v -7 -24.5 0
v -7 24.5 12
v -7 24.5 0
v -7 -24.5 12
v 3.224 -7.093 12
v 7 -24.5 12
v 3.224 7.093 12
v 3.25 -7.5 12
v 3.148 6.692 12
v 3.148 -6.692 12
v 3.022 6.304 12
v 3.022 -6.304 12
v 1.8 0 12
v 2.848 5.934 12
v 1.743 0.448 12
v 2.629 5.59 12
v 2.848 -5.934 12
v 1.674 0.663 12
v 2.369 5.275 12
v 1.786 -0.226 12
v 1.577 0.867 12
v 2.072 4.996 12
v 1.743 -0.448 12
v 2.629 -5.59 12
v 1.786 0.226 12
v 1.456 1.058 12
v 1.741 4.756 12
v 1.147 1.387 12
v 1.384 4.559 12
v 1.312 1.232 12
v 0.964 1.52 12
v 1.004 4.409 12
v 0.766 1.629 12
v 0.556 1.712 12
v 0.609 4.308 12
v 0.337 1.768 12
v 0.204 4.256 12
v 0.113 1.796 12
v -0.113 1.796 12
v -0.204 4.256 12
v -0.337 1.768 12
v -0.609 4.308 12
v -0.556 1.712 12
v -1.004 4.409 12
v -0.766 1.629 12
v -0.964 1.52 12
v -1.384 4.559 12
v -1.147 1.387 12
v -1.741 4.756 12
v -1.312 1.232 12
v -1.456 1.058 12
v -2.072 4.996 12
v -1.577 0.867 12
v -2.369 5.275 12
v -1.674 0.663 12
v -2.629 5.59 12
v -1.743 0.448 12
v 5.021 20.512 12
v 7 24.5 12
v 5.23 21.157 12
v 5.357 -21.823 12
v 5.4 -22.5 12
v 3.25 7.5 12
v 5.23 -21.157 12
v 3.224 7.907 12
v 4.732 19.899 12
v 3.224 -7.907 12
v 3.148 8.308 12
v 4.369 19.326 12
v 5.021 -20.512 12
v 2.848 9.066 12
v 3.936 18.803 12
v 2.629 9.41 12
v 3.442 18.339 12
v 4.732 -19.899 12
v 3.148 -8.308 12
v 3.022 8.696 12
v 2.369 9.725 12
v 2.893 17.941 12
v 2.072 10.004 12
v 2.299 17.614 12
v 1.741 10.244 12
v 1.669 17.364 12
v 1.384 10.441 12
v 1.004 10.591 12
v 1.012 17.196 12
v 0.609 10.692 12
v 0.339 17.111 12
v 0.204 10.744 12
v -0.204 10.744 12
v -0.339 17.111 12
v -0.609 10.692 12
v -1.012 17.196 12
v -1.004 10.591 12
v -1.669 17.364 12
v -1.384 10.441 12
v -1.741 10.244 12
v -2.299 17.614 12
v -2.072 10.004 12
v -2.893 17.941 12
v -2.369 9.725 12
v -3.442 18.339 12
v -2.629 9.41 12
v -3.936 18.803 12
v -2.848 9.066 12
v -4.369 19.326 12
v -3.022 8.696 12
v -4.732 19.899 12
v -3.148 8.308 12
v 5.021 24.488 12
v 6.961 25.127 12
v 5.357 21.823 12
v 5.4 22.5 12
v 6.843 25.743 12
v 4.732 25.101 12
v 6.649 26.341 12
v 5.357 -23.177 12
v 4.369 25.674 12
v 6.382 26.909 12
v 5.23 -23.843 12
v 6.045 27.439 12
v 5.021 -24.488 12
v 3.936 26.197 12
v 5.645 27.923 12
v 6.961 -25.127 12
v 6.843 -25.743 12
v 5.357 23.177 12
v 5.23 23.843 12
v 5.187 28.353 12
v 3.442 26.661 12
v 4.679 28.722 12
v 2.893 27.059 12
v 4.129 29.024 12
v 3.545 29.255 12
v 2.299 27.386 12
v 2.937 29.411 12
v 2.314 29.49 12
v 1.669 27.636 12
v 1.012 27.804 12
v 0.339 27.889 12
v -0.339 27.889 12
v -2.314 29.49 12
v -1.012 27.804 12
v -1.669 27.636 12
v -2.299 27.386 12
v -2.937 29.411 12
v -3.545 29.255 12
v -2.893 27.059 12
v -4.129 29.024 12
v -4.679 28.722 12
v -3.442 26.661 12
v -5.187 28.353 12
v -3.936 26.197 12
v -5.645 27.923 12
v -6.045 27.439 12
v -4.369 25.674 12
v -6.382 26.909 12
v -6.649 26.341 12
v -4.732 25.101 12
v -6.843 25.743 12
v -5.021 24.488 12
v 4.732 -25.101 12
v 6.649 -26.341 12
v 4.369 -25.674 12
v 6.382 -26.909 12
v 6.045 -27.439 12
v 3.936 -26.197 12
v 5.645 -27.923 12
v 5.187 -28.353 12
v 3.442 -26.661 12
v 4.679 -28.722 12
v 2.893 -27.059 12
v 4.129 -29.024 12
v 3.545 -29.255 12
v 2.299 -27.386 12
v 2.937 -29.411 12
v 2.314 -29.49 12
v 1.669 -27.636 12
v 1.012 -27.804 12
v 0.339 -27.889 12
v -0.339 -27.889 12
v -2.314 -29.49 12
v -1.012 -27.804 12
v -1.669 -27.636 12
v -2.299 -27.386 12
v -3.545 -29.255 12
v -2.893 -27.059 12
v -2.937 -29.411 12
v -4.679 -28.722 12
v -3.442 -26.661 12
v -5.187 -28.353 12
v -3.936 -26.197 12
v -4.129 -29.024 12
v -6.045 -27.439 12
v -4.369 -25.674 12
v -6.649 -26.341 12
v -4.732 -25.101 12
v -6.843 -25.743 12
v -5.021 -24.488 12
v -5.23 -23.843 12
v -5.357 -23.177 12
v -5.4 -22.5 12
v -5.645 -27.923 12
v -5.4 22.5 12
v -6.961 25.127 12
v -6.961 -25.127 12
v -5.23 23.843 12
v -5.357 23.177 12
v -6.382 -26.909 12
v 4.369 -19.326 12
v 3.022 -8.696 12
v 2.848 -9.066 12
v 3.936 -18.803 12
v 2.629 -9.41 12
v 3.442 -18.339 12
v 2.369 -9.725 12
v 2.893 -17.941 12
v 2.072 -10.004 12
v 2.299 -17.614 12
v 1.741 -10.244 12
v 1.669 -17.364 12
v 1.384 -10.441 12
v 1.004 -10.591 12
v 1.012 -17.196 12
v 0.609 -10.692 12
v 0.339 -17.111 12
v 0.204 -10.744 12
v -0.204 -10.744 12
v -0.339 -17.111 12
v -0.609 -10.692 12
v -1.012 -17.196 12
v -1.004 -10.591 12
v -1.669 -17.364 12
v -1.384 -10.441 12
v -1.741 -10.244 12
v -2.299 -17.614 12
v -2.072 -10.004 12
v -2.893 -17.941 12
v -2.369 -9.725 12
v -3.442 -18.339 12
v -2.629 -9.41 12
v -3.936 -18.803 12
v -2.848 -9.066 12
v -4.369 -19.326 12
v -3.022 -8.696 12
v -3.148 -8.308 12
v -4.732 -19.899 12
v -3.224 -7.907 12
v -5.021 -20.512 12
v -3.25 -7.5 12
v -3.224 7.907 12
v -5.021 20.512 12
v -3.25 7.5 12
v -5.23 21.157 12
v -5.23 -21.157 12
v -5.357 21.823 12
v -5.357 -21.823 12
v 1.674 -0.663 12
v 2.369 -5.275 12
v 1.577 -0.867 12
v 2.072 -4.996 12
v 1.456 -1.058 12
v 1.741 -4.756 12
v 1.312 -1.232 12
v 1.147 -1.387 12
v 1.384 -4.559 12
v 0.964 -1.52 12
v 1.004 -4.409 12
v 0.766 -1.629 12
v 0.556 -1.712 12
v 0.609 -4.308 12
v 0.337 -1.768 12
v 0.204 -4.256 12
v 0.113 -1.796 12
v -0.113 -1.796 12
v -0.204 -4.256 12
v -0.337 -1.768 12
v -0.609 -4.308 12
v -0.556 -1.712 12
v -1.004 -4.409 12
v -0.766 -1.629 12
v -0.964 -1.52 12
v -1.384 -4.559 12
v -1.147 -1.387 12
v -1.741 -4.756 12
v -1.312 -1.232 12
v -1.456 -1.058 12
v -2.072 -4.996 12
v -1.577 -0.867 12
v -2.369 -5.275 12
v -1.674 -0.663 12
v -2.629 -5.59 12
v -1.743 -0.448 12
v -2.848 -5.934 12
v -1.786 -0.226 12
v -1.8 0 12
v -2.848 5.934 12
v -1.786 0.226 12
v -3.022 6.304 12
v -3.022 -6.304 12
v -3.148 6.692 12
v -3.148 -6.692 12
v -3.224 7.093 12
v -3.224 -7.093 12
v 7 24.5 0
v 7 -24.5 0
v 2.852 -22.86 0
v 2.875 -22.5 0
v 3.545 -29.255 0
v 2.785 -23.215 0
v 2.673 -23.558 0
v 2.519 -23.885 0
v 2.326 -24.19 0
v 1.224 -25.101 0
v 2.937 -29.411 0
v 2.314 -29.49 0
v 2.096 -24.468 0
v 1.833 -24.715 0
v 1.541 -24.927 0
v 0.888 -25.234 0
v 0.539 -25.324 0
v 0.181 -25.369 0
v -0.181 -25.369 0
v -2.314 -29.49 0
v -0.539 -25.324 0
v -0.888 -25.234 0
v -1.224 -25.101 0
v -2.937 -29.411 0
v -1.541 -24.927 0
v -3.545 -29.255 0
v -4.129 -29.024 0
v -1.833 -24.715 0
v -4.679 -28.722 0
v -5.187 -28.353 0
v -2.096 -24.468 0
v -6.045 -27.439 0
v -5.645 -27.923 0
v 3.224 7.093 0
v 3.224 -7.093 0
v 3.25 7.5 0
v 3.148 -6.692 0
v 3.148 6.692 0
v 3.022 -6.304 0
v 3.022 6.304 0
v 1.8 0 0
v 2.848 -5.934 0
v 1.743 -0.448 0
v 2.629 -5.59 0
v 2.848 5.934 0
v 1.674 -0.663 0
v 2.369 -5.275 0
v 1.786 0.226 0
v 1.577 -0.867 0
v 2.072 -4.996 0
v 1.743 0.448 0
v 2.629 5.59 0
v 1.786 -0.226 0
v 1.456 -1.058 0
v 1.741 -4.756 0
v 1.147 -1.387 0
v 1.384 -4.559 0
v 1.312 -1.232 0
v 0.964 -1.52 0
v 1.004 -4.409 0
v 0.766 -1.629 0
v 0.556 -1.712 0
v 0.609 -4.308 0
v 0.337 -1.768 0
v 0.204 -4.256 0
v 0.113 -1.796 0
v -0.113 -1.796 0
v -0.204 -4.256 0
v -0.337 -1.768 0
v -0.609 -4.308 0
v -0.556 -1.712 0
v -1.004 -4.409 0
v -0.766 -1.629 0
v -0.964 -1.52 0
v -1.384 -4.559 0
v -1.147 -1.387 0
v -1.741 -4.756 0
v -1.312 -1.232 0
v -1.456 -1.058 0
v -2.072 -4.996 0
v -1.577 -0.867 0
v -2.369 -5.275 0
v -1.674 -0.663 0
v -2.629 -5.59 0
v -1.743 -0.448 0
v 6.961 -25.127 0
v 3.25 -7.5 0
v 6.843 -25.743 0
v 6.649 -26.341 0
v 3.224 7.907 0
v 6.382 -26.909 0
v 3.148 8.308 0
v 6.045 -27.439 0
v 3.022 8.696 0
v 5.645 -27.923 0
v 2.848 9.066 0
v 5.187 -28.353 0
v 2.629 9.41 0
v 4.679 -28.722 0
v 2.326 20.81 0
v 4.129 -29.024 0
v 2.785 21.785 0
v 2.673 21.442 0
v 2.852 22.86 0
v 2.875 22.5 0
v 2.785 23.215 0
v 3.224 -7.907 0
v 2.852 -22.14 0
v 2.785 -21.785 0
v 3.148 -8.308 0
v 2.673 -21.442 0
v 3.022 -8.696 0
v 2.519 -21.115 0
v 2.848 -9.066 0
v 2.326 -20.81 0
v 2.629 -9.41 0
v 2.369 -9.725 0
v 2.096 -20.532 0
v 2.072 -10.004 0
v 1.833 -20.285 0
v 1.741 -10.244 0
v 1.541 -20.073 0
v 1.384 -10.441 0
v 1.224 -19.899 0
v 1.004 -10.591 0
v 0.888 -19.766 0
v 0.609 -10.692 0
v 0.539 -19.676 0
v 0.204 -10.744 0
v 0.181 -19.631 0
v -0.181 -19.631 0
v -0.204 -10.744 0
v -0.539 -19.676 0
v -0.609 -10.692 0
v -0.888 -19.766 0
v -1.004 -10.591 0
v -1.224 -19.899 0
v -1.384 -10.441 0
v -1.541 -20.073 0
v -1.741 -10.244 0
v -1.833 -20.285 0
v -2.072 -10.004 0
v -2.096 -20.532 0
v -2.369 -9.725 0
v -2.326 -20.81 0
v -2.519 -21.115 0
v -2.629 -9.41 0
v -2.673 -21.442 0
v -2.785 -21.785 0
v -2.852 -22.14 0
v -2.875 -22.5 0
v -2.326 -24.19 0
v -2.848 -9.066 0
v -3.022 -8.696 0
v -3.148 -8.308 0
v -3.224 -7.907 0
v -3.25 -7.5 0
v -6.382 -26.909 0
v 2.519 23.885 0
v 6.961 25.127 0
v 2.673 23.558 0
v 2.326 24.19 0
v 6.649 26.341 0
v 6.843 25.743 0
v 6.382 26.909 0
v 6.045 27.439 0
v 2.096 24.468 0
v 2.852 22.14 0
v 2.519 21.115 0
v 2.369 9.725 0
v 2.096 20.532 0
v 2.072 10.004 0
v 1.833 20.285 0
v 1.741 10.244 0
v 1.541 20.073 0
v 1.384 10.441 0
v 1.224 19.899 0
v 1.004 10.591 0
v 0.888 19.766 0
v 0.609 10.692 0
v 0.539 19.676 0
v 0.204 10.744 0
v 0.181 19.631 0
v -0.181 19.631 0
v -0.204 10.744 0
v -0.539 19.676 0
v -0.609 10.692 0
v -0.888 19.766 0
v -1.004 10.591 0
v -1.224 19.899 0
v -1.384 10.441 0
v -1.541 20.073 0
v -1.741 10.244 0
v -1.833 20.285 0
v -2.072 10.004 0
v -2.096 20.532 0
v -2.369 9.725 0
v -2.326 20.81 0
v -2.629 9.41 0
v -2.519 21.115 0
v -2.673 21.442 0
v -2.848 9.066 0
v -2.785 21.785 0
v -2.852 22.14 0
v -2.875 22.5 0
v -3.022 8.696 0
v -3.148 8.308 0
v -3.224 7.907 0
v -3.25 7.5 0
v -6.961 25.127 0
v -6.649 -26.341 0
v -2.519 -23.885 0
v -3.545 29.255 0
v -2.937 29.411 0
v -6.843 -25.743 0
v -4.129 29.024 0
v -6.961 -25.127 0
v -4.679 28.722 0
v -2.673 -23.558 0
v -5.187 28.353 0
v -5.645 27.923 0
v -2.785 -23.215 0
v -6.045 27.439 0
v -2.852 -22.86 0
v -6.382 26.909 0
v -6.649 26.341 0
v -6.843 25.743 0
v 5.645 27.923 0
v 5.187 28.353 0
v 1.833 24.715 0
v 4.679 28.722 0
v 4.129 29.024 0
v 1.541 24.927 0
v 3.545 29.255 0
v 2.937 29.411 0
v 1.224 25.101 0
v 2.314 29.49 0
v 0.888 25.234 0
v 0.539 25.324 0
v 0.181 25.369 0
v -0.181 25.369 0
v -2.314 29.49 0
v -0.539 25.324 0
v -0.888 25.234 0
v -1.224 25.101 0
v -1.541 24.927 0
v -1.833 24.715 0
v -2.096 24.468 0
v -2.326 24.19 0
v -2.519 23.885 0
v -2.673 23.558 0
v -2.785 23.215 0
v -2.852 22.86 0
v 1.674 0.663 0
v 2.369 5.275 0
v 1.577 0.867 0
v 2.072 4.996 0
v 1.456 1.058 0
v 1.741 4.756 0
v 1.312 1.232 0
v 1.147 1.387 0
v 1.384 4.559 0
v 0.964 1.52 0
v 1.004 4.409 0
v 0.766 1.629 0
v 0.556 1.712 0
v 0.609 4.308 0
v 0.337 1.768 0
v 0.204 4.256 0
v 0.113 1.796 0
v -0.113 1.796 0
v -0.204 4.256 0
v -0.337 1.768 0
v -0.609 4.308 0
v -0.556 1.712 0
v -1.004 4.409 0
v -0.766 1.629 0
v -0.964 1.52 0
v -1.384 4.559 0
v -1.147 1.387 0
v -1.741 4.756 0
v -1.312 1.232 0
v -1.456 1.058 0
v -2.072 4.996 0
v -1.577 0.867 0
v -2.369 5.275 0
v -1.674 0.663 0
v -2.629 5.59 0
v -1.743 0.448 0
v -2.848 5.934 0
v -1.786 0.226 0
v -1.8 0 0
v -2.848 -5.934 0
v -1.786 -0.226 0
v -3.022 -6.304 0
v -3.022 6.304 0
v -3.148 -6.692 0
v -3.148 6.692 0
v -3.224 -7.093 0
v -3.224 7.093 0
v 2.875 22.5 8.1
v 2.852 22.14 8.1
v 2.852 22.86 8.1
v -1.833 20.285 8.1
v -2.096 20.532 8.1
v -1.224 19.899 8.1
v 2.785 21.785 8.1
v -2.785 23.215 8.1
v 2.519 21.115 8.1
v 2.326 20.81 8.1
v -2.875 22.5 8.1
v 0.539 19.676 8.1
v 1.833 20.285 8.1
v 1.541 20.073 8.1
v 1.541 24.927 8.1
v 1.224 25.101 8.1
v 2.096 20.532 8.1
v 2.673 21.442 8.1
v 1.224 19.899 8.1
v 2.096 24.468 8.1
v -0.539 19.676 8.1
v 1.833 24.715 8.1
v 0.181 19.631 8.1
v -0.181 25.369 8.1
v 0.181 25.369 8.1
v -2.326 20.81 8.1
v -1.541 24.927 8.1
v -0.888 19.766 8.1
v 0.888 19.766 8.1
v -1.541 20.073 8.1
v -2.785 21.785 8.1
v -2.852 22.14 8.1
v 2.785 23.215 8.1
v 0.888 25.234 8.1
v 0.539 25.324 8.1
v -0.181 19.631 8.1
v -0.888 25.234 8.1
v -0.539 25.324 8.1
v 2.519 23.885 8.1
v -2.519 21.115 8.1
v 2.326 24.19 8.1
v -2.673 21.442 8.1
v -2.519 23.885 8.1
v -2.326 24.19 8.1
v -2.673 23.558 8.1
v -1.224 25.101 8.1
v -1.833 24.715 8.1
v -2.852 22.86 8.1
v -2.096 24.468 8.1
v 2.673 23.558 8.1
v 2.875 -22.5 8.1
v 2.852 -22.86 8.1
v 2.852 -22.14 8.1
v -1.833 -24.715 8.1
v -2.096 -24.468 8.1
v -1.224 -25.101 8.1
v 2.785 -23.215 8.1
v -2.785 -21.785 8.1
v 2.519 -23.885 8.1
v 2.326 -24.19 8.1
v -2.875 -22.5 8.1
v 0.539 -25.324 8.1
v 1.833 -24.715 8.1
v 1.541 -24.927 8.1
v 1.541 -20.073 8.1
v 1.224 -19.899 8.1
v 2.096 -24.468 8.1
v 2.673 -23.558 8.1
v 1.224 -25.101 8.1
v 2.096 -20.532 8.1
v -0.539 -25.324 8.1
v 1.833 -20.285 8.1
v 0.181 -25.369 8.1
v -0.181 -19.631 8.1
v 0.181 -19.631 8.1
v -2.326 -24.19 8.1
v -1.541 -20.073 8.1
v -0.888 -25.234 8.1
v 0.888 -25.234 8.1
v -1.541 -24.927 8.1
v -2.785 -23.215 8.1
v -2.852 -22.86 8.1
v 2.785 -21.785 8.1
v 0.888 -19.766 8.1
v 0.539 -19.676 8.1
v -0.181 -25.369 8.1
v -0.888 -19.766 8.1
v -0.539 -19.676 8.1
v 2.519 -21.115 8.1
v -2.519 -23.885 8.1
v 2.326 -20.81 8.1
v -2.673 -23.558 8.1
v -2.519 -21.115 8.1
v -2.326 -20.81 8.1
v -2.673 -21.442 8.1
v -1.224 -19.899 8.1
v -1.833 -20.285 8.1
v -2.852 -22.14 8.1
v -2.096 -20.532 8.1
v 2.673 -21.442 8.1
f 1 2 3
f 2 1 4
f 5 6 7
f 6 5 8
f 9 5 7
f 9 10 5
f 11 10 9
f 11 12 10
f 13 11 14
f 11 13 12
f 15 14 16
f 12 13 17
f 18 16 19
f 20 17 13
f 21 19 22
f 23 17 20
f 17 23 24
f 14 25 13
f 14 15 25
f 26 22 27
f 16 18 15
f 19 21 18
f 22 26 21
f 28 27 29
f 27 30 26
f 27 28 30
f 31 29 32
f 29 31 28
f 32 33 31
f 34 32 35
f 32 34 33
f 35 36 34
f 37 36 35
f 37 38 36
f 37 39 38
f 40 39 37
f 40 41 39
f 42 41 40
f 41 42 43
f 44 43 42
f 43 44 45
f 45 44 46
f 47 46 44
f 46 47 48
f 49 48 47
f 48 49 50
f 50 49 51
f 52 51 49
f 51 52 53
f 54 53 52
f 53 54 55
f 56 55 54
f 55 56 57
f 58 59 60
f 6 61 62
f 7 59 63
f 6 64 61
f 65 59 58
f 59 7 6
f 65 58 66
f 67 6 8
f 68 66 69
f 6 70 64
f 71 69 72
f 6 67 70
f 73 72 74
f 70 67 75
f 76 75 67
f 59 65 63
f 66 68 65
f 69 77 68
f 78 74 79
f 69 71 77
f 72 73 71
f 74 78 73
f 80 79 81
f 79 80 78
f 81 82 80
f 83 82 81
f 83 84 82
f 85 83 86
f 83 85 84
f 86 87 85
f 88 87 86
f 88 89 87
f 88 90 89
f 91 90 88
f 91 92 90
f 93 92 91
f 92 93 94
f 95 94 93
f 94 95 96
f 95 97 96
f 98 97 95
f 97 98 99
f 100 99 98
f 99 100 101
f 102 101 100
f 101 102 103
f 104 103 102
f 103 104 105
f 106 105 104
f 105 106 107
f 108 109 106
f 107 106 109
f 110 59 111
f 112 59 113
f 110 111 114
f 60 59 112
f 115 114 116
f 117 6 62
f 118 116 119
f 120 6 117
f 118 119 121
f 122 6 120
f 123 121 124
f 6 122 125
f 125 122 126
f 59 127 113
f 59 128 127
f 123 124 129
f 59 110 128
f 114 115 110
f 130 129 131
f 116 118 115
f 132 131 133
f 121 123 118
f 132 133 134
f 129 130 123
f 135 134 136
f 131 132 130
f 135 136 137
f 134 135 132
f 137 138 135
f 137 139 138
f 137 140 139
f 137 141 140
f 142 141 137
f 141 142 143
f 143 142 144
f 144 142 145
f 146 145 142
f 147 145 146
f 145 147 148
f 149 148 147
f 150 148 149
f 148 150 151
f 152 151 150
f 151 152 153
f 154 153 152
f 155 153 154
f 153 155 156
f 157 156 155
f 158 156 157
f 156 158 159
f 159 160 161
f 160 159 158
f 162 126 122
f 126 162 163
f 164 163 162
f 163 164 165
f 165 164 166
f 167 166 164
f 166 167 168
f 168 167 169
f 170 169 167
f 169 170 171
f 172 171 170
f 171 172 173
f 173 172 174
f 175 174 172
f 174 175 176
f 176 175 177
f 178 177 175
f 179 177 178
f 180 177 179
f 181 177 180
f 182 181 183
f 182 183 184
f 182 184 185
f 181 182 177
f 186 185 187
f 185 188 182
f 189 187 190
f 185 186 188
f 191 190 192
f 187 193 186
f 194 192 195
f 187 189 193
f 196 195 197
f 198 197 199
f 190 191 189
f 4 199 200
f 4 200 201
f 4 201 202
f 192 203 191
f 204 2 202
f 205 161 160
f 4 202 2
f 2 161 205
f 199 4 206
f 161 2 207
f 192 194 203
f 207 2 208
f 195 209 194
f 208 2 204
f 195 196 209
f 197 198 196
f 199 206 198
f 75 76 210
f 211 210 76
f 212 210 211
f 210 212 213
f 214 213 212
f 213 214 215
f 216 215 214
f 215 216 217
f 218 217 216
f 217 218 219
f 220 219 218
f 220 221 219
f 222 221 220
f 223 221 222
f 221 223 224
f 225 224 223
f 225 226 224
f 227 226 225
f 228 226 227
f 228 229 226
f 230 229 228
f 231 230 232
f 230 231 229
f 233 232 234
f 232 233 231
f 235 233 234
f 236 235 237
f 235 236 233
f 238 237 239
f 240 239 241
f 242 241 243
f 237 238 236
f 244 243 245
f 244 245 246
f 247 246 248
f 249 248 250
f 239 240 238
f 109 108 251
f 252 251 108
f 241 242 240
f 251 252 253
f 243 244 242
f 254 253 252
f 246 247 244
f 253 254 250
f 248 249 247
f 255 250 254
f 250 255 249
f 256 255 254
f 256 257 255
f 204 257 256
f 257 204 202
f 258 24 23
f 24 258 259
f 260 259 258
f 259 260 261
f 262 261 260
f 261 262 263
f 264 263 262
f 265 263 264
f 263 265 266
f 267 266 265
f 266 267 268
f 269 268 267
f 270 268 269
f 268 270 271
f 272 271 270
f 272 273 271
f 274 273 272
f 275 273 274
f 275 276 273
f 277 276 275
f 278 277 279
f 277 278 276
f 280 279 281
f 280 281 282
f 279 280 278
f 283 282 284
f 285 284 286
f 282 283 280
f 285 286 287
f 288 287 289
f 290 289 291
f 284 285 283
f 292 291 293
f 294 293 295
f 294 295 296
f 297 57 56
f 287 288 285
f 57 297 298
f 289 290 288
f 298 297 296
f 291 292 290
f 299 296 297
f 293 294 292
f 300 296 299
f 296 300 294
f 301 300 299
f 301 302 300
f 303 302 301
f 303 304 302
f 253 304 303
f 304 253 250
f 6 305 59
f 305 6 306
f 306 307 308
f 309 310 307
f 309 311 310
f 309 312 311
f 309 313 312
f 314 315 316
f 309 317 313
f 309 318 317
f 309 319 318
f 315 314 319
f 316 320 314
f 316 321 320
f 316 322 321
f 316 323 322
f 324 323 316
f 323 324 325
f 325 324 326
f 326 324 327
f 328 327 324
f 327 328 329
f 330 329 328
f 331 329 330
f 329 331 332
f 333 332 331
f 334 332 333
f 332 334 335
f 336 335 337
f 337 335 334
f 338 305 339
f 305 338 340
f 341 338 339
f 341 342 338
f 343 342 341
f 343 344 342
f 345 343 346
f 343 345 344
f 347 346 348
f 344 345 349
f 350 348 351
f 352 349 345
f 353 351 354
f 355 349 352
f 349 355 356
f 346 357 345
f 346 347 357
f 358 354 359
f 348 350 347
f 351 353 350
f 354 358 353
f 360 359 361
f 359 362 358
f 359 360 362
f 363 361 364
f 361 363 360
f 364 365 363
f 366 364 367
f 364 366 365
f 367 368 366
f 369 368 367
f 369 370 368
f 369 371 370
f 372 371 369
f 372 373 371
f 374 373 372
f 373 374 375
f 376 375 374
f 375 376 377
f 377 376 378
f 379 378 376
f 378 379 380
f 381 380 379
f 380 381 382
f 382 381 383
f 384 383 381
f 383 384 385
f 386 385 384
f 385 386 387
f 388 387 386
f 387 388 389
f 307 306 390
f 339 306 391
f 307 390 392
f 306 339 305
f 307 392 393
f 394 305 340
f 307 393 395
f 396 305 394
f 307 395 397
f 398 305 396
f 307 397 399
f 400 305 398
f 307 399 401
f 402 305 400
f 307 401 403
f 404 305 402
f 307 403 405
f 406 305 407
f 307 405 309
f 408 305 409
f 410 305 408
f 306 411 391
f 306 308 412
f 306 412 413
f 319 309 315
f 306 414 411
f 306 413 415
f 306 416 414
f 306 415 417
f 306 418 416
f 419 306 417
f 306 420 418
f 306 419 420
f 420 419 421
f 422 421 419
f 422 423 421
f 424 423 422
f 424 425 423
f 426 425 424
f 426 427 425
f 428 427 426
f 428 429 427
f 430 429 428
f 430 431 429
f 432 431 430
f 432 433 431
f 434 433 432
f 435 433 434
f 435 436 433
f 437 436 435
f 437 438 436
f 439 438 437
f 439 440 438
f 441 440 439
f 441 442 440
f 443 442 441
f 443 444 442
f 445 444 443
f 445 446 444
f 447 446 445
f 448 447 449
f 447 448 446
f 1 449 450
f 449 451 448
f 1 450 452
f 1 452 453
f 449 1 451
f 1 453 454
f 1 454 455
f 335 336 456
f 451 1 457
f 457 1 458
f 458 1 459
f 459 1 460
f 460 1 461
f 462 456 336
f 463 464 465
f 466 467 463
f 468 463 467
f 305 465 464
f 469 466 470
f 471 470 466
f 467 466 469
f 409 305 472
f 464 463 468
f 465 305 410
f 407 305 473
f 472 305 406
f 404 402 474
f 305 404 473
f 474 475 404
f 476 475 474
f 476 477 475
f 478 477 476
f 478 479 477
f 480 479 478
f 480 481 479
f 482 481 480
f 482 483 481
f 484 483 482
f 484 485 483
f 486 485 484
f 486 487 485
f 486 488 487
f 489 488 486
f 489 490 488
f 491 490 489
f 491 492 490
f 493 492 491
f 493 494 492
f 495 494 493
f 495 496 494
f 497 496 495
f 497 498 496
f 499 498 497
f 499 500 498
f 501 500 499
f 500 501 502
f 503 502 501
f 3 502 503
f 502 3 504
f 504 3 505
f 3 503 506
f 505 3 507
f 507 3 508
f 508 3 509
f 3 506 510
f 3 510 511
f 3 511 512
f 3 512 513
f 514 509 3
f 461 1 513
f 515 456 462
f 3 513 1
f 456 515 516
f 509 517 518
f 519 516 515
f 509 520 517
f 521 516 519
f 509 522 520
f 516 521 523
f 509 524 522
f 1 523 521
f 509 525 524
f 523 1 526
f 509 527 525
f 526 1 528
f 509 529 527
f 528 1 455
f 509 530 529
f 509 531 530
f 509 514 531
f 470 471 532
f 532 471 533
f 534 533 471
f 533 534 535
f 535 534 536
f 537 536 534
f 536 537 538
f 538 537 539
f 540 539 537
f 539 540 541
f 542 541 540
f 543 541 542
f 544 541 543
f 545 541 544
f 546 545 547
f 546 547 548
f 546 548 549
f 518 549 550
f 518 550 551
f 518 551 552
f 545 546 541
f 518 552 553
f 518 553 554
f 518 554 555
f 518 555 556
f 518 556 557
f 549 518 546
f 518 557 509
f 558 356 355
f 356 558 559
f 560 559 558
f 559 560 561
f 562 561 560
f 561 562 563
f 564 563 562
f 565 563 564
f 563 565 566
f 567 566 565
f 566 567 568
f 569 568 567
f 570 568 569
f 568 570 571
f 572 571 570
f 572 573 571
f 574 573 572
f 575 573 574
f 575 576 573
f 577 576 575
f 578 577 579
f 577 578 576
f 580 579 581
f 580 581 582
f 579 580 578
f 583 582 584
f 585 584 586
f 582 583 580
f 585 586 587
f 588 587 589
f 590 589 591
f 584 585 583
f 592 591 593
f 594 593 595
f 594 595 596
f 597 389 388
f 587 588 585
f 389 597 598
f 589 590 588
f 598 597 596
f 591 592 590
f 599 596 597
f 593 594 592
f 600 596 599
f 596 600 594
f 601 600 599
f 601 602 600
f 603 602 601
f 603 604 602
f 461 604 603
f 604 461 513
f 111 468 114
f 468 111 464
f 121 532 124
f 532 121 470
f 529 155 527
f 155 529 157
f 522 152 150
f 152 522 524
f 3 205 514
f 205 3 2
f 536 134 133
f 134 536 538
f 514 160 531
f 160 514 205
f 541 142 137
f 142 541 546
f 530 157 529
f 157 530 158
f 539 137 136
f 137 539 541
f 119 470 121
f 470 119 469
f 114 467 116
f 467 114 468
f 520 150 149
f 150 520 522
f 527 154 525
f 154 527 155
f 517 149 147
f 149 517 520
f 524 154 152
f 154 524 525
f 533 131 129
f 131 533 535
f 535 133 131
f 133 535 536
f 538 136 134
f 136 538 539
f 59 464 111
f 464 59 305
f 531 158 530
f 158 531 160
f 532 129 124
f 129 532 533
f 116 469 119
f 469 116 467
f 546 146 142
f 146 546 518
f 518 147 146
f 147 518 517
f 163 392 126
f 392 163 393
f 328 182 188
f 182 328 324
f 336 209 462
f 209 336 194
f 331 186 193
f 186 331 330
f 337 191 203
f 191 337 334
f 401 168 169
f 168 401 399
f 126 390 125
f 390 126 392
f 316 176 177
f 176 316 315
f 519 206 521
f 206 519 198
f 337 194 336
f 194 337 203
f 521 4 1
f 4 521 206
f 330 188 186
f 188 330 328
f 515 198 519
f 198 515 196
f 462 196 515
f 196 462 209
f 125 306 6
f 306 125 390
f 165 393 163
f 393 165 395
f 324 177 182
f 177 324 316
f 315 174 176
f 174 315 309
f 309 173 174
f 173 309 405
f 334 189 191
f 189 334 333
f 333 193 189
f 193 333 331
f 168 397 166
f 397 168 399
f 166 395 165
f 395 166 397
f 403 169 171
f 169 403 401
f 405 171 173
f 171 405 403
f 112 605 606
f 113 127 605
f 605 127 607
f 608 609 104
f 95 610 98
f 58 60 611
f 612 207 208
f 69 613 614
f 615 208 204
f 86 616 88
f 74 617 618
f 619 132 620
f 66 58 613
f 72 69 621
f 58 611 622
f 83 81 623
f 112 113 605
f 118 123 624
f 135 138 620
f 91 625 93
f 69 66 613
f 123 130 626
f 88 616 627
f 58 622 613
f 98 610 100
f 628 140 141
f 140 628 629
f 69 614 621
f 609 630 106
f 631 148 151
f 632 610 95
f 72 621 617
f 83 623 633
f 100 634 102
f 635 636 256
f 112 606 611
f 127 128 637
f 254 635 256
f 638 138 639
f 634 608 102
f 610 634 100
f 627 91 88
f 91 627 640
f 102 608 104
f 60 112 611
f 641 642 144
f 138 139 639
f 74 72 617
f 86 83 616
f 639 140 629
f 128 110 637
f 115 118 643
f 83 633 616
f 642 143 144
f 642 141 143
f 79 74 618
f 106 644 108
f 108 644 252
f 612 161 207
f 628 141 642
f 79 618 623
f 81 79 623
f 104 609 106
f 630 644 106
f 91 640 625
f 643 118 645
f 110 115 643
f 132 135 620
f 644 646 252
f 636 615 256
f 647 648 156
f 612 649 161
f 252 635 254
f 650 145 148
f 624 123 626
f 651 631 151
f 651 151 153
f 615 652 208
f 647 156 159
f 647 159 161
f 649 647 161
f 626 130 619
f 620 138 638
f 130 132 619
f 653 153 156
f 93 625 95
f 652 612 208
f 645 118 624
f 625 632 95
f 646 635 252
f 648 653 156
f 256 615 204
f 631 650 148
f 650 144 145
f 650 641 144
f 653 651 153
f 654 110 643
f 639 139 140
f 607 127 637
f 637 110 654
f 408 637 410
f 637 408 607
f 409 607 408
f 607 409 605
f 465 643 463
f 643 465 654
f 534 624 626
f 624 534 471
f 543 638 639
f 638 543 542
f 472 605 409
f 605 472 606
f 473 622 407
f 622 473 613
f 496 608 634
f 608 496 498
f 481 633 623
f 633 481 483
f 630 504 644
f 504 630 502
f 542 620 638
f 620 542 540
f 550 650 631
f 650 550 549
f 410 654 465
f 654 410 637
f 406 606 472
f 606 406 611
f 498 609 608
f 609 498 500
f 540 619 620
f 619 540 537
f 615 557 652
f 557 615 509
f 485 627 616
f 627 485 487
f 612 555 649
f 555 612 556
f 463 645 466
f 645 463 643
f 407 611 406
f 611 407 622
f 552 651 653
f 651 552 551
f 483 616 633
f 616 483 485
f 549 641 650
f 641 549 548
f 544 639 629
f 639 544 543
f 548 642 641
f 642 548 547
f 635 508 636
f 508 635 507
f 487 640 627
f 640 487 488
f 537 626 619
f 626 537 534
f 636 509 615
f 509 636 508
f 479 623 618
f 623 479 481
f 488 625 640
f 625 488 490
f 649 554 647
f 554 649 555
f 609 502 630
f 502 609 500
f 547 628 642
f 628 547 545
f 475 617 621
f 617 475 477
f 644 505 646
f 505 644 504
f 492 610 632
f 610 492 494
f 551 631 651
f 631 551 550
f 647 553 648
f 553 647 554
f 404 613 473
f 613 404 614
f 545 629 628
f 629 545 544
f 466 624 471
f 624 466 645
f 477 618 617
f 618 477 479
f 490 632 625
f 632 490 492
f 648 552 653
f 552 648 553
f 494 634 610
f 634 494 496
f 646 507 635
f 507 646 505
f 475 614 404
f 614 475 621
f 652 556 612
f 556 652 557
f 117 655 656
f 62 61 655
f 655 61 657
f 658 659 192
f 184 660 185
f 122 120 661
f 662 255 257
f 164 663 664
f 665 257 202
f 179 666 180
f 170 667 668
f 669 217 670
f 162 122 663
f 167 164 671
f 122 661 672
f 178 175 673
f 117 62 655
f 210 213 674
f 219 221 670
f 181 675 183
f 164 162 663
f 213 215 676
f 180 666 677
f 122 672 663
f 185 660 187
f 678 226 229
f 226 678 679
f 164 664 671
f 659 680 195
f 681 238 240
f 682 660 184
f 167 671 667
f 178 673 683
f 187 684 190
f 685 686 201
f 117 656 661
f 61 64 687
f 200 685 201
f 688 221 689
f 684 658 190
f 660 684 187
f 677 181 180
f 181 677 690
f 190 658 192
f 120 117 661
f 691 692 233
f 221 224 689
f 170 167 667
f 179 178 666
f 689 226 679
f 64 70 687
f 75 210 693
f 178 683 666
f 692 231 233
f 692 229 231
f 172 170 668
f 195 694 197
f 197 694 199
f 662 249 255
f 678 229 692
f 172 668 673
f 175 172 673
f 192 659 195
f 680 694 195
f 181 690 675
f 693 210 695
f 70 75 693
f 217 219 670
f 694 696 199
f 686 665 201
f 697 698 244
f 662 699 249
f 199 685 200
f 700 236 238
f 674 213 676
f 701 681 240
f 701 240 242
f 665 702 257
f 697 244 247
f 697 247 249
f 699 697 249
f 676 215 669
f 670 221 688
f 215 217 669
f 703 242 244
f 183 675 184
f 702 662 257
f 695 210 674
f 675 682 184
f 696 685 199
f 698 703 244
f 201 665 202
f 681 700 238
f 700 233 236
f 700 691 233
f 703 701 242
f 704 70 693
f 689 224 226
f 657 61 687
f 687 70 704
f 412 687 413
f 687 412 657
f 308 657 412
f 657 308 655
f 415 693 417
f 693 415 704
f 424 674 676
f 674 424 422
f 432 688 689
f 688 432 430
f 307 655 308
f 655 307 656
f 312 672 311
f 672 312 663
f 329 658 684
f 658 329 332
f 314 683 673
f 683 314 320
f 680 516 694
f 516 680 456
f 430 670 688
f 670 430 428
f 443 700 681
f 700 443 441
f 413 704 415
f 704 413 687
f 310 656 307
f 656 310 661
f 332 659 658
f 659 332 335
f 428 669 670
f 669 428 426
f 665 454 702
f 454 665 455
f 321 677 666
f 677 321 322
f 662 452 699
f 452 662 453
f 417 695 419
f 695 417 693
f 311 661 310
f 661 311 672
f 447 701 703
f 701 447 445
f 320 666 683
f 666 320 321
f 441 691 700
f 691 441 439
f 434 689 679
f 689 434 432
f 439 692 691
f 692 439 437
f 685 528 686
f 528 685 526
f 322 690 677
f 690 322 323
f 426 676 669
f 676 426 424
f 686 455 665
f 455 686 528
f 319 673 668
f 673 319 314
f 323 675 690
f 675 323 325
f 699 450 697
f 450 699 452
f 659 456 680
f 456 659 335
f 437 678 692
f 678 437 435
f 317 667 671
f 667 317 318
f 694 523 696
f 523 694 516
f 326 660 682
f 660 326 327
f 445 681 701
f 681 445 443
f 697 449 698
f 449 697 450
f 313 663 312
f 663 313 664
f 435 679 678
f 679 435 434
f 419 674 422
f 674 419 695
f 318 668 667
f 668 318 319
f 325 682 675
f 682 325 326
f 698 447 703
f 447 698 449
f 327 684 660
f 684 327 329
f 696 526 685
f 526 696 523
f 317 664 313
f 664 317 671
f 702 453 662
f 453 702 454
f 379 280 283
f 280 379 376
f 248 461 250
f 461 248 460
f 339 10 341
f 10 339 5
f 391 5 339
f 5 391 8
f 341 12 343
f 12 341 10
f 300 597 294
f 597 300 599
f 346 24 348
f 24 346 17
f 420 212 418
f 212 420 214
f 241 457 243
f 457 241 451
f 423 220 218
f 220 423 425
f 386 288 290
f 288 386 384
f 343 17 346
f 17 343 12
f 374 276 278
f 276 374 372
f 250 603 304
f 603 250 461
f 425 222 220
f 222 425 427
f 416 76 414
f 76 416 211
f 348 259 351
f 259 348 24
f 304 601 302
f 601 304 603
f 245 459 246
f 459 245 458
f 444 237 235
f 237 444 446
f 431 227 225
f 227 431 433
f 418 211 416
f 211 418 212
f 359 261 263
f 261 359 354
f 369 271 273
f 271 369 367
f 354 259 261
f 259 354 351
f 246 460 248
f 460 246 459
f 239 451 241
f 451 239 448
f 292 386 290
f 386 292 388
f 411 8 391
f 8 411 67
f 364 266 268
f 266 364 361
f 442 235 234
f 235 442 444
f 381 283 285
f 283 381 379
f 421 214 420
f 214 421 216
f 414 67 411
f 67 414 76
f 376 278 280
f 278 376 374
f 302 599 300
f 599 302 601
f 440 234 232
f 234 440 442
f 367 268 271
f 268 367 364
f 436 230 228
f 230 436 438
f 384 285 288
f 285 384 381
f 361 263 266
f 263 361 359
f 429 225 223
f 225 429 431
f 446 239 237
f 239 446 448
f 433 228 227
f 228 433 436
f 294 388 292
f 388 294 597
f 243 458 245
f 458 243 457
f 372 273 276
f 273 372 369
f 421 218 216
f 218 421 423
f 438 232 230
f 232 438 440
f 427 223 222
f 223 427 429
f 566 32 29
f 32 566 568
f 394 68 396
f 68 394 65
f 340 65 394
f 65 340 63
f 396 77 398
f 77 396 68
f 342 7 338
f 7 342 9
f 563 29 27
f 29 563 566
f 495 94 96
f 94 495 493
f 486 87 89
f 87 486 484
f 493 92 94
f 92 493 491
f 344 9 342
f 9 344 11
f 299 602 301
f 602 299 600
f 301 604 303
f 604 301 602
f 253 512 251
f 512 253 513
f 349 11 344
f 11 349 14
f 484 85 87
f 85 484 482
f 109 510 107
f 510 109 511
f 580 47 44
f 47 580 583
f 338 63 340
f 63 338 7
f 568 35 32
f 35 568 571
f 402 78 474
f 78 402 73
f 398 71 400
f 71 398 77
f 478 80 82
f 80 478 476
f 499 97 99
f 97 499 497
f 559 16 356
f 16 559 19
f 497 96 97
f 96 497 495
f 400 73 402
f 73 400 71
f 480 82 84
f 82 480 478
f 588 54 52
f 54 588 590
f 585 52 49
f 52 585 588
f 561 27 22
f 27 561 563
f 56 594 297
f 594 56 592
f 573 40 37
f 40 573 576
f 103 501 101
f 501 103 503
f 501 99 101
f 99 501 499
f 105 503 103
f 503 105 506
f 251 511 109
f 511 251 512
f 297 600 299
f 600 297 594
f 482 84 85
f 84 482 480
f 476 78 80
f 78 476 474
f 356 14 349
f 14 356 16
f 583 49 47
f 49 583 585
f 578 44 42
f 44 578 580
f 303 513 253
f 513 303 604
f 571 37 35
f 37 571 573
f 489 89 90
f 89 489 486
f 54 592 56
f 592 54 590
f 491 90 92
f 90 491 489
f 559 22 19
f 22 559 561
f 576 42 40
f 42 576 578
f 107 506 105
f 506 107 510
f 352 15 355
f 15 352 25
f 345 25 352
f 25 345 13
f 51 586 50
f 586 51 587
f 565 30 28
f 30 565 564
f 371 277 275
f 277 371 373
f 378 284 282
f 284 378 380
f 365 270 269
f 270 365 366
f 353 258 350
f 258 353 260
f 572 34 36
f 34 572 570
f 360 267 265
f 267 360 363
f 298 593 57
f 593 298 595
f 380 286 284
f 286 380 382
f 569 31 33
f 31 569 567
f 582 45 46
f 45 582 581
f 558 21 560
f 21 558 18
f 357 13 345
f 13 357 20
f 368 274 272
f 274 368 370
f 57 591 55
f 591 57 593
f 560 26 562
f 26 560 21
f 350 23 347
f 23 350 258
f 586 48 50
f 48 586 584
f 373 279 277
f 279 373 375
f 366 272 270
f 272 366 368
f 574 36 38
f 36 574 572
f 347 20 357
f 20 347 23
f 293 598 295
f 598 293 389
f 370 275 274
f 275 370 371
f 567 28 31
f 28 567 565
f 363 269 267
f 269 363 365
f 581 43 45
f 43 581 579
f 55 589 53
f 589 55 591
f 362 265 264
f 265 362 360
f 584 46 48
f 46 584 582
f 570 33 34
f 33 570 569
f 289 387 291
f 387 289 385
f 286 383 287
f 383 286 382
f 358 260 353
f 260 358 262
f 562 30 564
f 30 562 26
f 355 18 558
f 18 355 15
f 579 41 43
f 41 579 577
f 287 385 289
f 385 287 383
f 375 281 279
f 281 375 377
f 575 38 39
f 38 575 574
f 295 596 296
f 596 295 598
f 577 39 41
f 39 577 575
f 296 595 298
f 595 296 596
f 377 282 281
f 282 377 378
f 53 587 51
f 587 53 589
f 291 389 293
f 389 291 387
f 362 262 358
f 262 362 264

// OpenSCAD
$fn = 50;


difference() {
	union() {
		hull() {
			translate(v = [-2.0000000000, 9.5000000000, 0]) {
				cylinder(h = 12, r = 5);
			}
			translate(v = [2.0000000000, 9.5000000000, 0]) {
				cylinder(h = 12, r = 5);
			}
			translate(v = [-2.0000000000, -9.5000000000, 0]) {
				cylinder(h = 12, r = 5);
			}
			translate(v = [2.0000000000, -9.5000000000, 0]) {
				cylinder(h = 12, r = 5);
			}
		}
		translate(v = [0.0000000000, 15.0000000000, 0]) {
			hull() {
				translate(v = [-2.0000000000, 9.5000000000, 0]) {
					cylinder(h = 12, r = 5);
				}
				translate(v = [2.0000000000, 9.5000000000, 0]) {
					cylinder(h = 12, r = 5);
				}
				translate(v = [-2.0000000000, -9.5000000000, 0]) {
					cylinder(h = 12, r = 5);
				}
				translate(v = [2.0000000000, -9.5000000000, 0]) {
					cylinder(h = 12, r = 5);
				}
			}
		}
		translate(v = [0.0000000000, 15.0000000000, 0]) {
			hull() {
				translate(v = [-2.0000000000, 9.5000000000, 0]) {
					cylinder(h = 12, r = 5);
				}
				translate(v = [2.0000000000, 9.5000000000, 0]) {
					cylinder(h = 12, r = 5);
				}
				translate(v = [-2.0000000000, -9.5000000000, 0]) {
					cylinder(h = 12, r = 5);
				}
				translate(v = [2.0000000000, -9.5000000000, 0]) {
					cylinder(h = 12, r = 5);
				}
			}
		}
		translate(v = [0.0000000000, -15.0000000000, 0]) {
			hull() {
				translate(v = [-2.0000000000, 9.5000000000, 0]) {
					cylinder(h = 12, r = 5);
				}
				translate(v = [2.0000000000, 9.5000000000, 0]) {
					cylinder(h = 12, r = 5);
				}
				translate(v = [-2.0000000000, -9.5000000000, 0]) {
					cylinder(h = 12, r = 5);
				}
				translate(v = [2.0000000000, -9.5000000000, 0]) {
					cylinder(h = 12, r = 5);
				}
			}
		}
		translate(v = [0.0000000000, -15.0000000000, 0]) {
			hull() {
				translate(v = [-2.0000000000, 9.5000000000, 0]) {
					cylinder(h = 12, r = 5);
				}
				translate(v = [2.0000000000, 9.5000000000, 0]) {
					cylinder(h = 12, r = 5);
				}
				translate(v = [-2.0000000000, -9.5000000000, 0]) {
					cylinder(h = 12, r = 5);
				}
				translate(v = [2.0000000000, -9.5000000000, 0]) {
					cylinder(h = 12, r = 5);
				}
			}
		}
	}
	union() {
		translate(v = [0.0000000000, 22.5000000000, 12]) {
			rotate(a = [0, 0, 0]) {
				difference() {
					union() {
						#translate(v = [0, 0, -12.0000000000]) {
							cylinder(h = 12, r = 2.6000000000);
						}
						#translate(v = [0, 0, -3.9000000000]) {
							cylinder(h = 3.9000000000, r1 = 2.8750000000, r2 = 5.4000000000);
						}
						#translate(v = [0, 0, -12.0000000000]) {
							cylinder(h = 12, r = 2.8750000000);
						}
						#translate(v = [0, 0, -12.0000000000]) {
							cylinder(h = 12, r = 2.6000000000);
						}
					}
					union();
				}
			}
		}
		translate(v = [0.0000000000, 22.5000000000, 12]) {
			rotate(a = [0, 0, 0]) {
				difference() {
					union() {
						#translate(v = [0, 0, -12.0000000000]) {
							cylinder(h = 12, r = 2.6000000000);
						}
						#translate(v = [0, 0, -3.9000000000]) {
							cylinder(h = 3.9000000000, r1 = 2.8750000000, r2 = 5.4000000000);
						}
						#translate(v = [0, 0, -12.0000000000]) {
							cylinder(h = 12, r = 2.8750000000);
						}
						#translate(v = [0, 0, -12.0000000000]) {
							cylinder(h = 12, r = 2.6000000000);
						}
					}
					union();
				}
			}
		}
		translate(v = [0.0000000000, -22.5000000000, 12]) {
			rotate(a = [0, 0, 0]) {
				difference() {
					union() {
						#translate(v = [0, 0, -12.0000000000]) {
							cylinder(h = 12, r = 2.6000000000);
						}
						#translate(v = [0, 0, -3.9000000000]) {
							cylinder(h = 3.9000000000, r1 = 2.8750000000, r2 = 5.4000000000);
						}
						#translate(v = [0, 0, -12.0000000000]) {
							cylinder(h = 12, r = 2.8750000000);
						}
						#translate(v = [0, 0, -12.0000000000]) {
							cylinder(h = 12, r = 2.6000000000);
						}
					}
					union();
				}
			}
		}
		translate(v = [0.0000000000, -22.5000000000, 12]) {
			rotate(a = [0, 0, 0]) {
				difference() {
					union() {
						#translate(v = [0, 0, -12.0000000000]) {
							cylinder(h = 12, r = 2.6000000000);
						}
						#translate(v = [0, 0, -3.9000000000]) {
							cylinder(h = 3.9000000000, r1 = 2.8750000000, r2 = 5.4000000000);
						}
						#translate(v = [0, 0, -12.0000000000]) {
							cylinder(h = 12, r = 2.8750000000);
						}
						#translate(v = [0, 0, -12.0000000000]) {
							cylinder(h = 12, r = 2.6000000000);
						}
					}
					union();
				}
			}
		}
		translate(v = [0.0000000000, -7.5000000000, 0]) {
			translate(v = [0, 0, -100]) {
				cylinder(h = 200, r = 3.2500000000);
			}
		}
		translate(v = [0.0000000000, 7.5000000000, 0]) {
			translate(v = [0, 0, -100]) {
				cylinder(h = 200, r = 3.2500000000);
			}
		}
		translate(v = [0.0000000000, -7.5000000000, 0]) {
			translate(v = [0, 0, -100]) {
				cylinder(h = 200, r = 1.8000000000);
			}
		}
		translate(v = [0, 0, -100]) {
			cylinder(h = 200, r = 1.8000000000);
		}
		translate(v = [0.0000000000, 7.5000000000, 0]) {
			translate(v = [0, 0, -100]) {
				cylinder(h = 200, r = 1.8000000000);
			}
		}
	}
}
